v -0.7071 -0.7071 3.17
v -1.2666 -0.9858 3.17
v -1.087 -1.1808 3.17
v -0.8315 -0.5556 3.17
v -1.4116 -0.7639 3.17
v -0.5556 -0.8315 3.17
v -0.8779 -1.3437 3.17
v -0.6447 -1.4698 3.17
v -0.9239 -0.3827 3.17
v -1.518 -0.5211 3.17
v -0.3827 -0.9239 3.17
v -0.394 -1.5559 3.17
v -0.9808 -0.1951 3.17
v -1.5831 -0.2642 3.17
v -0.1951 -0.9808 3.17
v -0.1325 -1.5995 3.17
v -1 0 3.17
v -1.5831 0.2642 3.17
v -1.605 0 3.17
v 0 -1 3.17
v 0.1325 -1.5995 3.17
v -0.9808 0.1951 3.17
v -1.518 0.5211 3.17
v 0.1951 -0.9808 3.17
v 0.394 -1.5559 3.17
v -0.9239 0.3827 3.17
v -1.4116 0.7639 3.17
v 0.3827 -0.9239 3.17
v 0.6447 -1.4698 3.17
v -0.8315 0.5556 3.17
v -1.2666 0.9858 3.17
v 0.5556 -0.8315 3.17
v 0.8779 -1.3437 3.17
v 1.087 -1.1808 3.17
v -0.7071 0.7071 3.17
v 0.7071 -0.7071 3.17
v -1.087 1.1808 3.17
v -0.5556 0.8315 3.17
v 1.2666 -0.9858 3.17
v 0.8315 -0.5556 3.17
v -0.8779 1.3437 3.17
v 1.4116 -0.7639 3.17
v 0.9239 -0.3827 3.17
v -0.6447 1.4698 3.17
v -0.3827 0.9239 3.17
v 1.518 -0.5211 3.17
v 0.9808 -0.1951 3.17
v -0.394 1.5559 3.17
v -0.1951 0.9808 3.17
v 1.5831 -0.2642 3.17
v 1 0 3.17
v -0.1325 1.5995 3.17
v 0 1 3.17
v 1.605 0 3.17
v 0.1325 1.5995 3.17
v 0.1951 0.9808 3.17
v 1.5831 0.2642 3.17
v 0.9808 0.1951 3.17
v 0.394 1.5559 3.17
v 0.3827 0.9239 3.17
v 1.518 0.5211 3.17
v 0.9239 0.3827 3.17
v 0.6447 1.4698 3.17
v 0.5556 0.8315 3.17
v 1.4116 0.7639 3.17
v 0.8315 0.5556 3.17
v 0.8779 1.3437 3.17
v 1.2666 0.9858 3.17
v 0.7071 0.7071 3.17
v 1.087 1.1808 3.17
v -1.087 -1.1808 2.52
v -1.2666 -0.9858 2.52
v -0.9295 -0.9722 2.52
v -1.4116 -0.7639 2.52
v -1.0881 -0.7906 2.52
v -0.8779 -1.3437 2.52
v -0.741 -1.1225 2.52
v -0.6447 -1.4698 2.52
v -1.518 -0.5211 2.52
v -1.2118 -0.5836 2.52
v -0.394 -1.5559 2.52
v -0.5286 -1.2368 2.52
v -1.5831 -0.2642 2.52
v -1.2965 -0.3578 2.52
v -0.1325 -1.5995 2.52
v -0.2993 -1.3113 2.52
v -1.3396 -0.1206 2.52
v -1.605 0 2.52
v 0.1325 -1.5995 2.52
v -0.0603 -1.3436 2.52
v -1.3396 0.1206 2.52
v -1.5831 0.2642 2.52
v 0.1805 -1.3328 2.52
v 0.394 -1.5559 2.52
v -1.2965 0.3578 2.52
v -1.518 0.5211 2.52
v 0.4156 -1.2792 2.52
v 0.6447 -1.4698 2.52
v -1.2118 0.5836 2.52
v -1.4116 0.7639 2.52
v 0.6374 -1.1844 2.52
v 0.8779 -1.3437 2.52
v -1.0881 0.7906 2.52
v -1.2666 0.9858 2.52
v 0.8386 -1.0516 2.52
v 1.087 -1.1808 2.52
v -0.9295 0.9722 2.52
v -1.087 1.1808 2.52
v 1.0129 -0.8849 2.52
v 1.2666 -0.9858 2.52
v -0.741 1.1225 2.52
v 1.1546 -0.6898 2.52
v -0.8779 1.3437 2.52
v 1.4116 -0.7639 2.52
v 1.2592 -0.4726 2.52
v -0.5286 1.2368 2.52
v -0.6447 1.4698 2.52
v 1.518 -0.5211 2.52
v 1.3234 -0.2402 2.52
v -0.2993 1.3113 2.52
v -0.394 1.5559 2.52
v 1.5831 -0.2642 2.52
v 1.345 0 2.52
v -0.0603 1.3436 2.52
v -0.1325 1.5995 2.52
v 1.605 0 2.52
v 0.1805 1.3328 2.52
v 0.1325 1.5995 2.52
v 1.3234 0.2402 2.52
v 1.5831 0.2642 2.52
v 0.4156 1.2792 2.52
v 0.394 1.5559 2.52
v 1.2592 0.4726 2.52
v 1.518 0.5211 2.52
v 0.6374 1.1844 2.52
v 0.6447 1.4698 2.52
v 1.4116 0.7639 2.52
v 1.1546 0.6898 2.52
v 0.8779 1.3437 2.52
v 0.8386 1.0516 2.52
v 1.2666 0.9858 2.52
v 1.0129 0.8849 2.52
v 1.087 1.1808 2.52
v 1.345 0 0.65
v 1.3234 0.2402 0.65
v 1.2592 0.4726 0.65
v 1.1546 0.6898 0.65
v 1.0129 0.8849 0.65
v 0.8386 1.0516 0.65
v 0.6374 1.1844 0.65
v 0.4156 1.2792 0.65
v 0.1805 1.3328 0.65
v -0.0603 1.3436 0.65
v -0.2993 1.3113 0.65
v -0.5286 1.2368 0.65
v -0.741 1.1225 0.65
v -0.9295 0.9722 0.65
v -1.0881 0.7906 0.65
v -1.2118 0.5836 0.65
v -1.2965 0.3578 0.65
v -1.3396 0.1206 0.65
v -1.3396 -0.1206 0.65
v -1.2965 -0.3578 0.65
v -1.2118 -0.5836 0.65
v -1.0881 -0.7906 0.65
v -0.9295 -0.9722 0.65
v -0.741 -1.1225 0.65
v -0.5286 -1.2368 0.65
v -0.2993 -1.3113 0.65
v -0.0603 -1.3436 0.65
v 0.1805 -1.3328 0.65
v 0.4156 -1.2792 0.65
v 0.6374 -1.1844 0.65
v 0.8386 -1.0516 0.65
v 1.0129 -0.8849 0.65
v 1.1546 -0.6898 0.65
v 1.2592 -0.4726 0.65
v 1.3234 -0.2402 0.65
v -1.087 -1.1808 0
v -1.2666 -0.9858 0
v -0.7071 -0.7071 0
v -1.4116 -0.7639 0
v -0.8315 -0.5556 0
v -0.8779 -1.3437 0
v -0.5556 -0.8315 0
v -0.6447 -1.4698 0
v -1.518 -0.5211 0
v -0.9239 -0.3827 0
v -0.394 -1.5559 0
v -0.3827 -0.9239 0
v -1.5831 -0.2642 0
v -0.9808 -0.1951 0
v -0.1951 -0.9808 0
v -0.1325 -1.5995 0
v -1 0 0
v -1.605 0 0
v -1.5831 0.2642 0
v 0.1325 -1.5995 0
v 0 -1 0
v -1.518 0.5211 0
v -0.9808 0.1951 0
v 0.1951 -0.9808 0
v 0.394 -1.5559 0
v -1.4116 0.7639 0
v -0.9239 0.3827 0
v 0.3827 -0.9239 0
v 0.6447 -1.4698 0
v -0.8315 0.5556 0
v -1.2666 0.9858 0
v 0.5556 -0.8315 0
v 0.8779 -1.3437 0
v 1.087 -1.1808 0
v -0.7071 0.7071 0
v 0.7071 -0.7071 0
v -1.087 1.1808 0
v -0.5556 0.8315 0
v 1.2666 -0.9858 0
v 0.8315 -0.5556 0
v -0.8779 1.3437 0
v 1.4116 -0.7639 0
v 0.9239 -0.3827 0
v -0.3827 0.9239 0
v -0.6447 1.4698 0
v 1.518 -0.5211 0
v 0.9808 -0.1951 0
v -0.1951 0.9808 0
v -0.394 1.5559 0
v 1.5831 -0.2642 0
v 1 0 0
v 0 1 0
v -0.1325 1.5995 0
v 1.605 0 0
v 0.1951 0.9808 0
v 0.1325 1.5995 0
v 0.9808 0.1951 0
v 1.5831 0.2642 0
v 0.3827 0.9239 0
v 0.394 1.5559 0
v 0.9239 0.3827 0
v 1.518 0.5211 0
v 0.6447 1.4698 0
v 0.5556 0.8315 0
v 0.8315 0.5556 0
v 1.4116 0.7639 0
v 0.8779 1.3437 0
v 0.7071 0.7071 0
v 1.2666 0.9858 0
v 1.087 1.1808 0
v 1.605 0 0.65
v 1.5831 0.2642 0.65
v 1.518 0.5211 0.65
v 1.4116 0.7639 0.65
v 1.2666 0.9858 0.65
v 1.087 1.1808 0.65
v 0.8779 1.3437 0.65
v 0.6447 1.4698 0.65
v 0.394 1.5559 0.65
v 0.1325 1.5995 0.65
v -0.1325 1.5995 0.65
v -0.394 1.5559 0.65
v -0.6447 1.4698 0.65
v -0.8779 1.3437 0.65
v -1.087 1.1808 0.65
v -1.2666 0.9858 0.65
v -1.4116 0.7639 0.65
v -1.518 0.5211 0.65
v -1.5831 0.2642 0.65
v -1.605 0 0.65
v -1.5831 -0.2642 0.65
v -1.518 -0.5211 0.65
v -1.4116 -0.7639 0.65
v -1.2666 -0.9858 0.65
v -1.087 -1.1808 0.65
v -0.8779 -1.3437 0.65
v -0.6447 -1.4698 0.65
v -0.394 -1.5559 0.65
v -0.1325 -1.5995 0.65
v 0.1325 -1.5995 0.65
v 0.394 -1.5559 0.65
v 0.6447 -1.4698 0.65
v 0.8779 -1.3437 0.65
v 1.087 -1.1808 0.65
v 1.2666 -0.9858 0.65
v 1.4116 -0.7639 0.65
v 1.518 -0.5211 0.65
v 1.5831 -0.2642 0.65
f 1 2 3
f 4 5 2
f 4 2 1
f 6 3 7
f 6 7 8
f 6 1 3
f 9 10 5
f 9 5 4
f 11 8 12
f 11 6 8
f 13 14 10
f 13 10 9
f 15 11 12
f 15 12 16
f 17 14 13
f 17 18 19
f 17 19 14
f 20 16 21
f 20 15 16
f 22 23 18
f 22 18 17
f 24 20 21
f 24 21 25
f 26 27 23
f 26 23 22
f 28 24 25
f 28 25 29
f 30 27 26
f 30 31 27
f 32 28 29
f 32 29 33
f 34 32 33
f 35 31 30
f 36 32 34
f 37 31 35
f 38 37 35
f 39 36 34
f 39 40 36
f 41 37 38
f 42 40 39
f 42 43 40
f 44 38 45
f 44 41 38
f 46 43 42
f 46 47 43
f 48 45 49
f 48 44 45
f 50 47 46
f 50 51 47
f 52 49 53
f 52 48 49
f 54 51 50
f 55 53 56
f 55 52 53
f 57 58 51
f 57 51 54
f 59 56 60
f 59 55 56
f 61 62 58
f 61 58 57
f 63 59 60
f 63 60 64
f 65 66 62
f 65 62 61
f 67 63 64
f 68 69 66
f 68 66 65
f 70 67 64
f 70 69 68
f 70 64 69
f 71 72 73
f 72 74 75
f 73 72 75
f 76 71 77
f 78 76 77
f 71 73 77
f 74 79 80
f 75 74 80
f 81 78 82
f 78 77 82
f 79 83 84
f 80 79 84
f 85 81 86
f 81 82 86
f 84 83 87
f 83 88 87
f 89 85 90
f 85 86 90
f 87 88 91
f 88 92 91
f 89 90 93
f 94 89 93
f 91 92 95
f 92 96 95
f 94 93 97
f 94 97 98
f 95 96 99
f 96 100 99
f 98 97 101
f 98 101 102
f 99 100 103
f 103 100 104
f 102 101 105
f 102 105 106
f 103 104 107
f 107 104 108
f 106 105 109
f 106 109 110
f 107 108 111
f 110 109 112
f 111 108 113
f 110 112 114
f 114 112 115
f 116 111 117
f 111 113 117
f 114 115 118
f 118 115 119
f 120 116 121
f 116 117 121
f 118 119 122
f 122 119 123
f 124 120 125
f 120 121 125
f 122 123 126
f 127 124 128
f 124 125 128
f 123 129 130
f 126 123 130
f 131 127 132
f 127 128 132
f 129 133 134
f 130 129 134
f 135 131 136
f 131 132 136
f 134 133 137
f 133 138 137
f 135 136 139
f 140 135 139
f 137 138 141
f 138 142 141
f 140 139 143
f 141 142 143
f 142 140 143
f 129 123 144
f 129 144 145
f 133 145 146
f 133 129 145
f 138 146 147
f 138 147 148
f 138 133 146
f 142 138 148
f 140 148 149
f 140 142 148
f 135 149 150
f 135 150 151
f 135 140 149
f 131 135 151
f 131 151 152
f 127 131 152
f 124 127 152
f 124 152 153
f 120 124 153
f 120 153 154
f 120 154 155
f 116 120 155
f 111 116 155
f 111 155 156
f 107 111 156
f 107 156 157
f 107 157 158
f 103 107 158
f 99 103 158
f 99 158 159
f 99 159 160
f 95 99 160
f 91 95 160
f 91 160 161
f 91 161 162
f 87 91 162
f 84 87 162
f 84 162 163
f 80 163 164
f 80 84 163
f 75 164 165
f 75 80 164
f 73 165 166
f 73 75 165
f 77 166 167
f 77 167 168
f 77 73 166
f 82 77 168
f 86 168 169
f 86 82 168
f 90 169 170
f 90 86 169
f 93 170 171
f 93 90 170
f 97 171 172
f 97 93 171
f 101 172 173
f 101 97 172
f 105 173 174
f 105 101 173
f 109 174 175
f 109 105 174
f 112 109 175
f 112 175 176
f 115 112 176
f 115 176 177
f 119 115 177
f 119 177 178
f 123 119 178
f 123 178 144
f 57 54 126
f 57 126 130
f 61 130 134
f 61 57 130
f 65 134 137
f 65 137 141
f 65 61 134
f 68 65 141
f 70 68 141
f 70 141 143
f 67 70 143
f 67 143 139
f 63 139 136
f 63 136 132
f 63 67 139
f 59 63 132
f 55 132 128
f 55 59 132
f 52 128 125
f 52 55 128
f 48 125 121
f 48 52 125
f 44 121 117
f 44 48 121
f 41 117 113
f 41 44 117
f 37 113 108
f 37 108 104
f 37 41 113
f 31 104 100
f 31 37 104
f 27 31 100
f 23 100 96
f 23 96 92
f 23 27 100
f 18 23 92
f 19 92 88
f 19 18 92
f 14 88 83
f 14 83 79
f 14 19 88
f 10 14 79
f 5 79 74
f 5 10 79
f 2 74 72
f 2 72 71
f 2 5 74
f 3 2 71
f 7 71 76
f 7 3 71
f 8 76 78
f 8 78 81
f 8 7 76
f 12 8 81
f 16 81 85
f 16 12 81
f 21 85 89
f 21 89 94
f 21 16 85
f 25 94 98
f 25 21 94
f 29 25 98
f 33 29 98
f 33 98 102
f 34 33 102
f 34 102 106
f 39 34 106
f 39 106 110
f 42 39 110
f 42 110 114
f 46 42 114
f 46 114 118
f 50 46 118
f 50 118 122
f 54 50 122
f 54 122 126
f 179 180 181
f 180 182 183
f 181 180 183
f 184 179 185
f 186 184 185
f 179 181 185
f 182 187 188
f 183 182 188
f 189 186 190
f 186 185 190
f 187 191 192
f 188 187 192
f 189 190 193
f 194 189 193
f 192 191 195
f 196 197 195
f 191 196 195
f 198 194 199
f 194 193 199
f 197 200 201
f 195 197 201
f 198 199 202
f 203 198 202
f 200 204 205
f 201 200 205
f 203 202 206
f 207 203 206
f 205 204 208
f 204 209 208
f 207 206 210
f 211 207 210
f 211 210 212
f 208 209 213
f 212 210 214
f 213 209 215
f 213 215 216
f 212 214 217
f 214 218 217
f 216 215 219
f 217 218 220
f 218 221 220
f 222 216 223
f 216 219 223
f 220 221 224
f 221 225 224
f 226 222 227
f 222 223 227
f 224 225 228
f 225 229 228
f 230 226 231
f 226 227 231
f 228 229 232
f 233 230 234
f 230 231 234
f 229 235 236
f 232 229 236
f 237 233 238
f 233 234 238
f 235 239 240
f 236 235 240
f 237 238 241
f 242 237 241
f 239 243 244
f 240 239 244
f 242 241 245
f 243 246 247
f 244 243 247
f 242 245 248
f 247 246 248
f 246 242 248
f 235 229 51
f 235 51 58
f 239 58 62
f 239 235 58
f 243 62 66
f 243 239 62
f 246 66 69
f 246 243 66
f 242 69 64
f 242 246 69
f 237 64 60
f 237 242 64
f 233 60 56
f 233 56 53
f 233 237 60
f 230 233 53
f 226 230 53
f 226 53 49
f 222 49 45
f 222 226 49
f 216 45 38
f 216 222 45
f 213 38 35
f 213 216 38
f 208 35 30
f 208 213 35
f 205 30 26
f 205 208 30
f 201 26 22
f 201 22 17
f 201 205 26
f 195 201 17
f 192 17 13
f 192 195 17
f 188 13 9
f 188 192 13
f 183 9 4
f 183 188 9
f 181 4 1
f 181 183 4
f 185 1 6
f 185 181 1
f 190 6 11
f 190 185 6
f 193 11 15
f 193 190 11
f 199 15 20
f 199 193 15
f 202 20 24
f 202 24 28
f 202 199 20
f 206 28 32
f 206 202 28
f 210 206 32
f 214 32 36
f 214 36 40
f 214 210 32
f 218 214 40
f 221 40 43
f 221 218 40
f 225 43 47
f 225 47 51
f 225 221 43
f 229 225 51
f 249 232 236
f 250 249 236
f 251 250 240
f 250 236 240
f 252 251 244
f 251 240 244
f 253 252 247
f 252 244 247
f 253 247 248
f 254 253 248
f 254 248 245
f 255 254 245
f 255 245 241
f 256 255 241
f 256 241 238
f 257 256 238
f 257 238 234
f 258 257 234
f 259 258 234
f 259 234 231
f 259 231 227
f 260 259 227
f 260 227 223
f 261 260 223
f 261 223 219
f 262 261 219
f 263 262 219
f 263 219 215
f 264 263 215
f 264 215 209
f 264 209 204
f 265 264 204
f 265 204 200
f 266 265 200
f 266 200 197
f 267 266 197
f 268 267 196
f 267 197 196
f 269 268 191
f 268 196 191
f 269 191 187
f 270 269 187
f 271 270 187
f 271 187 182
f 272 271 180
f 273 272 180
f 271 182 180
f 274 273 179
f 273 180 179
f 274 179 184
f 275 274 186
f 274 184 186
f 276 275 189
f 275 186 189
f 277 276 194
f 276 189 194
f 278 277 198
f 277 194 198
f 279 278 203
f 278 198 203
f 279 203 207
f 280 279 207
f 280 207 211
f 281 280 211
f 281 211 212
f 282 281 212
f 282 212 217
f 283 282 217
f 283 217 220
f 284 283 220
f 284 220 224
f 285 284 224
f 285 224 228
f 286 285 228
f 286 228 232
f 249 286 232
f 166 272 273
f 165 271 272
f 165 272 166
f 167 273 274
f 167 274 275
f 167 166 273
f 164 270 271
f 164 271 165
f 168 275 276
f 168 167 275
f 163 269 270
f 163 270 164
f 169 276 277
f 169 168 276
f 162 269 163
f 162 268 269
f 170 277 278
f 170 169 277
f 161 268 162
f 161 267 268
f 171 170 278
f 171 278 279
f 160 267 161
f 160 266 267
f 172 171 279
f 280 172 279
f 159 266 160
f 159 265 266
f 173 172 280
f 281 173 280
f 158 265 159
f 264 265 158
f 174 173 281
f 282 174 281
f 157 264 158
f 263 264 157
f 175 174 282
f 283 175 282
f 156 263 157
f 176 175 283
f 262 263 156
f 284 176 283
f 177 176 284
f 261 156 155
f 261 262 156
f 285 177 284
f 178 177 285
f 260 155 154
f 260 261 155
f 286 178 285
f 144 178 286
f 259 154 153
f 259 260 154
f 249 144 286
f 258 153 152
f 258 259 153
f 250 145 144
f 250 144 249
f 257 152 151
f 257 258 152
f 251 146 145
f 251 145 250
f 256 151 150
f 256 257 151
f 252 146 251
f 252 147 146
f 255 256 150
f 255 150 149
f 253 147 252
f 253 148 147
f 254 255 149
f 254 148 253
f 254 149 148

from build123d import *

# Parameters (mm, degrees)
F0_R     = 1.605
F0_R_2   = 1
F1_DEPTH = 3.17
F2_R     = 1.605
F2_R_2   = 1.345
F3_DEPTH = 2.52
F4_R     = 1.605
F4_R_2   = 1.345
F5_DEPTH = 0.65
F7_DEPTH = 0.65


with BuildPart() as f1:
    # F0 (on Top) → F1 (new body)
    with BuildSketch(Plane.XY):
        Circle(F0_R)
        Circle(F0_R_2, mode=Mode.SUBTRACT)
    extrude(amount=F1_DEPTH)

    # F2 (on face) → F3 (cut)
    with BuildSketch(Plane.XY.offset(3.17)):
        Circle(F2_R)
        Circle(F2_R_2, mode=Mode.SUBTRACT)
    extrude(amount=-F3_DEPTH, mode=Mode.SUBTRACT)

    # F4 (on face) → F7 (join)
    with BuildSketch(Plane.XY.offset(3.17)):
        Circle(F4_R)
        Circle(F4_R_2, mode=Mode.SUBTRACT)
    extrude(amount=-F7_DEPTH)


with BuildPart() as f5:
    # F4 (on face) → F5 (new body)
    with BuildSketch(Plane.XY.offset(3.17)):
        Circle(F4_R)
        Circle(F4_R_2, mode=Mode.SUBTRACT)
    extrude(amount=-F5_DEPTH)


solid = f1.part
